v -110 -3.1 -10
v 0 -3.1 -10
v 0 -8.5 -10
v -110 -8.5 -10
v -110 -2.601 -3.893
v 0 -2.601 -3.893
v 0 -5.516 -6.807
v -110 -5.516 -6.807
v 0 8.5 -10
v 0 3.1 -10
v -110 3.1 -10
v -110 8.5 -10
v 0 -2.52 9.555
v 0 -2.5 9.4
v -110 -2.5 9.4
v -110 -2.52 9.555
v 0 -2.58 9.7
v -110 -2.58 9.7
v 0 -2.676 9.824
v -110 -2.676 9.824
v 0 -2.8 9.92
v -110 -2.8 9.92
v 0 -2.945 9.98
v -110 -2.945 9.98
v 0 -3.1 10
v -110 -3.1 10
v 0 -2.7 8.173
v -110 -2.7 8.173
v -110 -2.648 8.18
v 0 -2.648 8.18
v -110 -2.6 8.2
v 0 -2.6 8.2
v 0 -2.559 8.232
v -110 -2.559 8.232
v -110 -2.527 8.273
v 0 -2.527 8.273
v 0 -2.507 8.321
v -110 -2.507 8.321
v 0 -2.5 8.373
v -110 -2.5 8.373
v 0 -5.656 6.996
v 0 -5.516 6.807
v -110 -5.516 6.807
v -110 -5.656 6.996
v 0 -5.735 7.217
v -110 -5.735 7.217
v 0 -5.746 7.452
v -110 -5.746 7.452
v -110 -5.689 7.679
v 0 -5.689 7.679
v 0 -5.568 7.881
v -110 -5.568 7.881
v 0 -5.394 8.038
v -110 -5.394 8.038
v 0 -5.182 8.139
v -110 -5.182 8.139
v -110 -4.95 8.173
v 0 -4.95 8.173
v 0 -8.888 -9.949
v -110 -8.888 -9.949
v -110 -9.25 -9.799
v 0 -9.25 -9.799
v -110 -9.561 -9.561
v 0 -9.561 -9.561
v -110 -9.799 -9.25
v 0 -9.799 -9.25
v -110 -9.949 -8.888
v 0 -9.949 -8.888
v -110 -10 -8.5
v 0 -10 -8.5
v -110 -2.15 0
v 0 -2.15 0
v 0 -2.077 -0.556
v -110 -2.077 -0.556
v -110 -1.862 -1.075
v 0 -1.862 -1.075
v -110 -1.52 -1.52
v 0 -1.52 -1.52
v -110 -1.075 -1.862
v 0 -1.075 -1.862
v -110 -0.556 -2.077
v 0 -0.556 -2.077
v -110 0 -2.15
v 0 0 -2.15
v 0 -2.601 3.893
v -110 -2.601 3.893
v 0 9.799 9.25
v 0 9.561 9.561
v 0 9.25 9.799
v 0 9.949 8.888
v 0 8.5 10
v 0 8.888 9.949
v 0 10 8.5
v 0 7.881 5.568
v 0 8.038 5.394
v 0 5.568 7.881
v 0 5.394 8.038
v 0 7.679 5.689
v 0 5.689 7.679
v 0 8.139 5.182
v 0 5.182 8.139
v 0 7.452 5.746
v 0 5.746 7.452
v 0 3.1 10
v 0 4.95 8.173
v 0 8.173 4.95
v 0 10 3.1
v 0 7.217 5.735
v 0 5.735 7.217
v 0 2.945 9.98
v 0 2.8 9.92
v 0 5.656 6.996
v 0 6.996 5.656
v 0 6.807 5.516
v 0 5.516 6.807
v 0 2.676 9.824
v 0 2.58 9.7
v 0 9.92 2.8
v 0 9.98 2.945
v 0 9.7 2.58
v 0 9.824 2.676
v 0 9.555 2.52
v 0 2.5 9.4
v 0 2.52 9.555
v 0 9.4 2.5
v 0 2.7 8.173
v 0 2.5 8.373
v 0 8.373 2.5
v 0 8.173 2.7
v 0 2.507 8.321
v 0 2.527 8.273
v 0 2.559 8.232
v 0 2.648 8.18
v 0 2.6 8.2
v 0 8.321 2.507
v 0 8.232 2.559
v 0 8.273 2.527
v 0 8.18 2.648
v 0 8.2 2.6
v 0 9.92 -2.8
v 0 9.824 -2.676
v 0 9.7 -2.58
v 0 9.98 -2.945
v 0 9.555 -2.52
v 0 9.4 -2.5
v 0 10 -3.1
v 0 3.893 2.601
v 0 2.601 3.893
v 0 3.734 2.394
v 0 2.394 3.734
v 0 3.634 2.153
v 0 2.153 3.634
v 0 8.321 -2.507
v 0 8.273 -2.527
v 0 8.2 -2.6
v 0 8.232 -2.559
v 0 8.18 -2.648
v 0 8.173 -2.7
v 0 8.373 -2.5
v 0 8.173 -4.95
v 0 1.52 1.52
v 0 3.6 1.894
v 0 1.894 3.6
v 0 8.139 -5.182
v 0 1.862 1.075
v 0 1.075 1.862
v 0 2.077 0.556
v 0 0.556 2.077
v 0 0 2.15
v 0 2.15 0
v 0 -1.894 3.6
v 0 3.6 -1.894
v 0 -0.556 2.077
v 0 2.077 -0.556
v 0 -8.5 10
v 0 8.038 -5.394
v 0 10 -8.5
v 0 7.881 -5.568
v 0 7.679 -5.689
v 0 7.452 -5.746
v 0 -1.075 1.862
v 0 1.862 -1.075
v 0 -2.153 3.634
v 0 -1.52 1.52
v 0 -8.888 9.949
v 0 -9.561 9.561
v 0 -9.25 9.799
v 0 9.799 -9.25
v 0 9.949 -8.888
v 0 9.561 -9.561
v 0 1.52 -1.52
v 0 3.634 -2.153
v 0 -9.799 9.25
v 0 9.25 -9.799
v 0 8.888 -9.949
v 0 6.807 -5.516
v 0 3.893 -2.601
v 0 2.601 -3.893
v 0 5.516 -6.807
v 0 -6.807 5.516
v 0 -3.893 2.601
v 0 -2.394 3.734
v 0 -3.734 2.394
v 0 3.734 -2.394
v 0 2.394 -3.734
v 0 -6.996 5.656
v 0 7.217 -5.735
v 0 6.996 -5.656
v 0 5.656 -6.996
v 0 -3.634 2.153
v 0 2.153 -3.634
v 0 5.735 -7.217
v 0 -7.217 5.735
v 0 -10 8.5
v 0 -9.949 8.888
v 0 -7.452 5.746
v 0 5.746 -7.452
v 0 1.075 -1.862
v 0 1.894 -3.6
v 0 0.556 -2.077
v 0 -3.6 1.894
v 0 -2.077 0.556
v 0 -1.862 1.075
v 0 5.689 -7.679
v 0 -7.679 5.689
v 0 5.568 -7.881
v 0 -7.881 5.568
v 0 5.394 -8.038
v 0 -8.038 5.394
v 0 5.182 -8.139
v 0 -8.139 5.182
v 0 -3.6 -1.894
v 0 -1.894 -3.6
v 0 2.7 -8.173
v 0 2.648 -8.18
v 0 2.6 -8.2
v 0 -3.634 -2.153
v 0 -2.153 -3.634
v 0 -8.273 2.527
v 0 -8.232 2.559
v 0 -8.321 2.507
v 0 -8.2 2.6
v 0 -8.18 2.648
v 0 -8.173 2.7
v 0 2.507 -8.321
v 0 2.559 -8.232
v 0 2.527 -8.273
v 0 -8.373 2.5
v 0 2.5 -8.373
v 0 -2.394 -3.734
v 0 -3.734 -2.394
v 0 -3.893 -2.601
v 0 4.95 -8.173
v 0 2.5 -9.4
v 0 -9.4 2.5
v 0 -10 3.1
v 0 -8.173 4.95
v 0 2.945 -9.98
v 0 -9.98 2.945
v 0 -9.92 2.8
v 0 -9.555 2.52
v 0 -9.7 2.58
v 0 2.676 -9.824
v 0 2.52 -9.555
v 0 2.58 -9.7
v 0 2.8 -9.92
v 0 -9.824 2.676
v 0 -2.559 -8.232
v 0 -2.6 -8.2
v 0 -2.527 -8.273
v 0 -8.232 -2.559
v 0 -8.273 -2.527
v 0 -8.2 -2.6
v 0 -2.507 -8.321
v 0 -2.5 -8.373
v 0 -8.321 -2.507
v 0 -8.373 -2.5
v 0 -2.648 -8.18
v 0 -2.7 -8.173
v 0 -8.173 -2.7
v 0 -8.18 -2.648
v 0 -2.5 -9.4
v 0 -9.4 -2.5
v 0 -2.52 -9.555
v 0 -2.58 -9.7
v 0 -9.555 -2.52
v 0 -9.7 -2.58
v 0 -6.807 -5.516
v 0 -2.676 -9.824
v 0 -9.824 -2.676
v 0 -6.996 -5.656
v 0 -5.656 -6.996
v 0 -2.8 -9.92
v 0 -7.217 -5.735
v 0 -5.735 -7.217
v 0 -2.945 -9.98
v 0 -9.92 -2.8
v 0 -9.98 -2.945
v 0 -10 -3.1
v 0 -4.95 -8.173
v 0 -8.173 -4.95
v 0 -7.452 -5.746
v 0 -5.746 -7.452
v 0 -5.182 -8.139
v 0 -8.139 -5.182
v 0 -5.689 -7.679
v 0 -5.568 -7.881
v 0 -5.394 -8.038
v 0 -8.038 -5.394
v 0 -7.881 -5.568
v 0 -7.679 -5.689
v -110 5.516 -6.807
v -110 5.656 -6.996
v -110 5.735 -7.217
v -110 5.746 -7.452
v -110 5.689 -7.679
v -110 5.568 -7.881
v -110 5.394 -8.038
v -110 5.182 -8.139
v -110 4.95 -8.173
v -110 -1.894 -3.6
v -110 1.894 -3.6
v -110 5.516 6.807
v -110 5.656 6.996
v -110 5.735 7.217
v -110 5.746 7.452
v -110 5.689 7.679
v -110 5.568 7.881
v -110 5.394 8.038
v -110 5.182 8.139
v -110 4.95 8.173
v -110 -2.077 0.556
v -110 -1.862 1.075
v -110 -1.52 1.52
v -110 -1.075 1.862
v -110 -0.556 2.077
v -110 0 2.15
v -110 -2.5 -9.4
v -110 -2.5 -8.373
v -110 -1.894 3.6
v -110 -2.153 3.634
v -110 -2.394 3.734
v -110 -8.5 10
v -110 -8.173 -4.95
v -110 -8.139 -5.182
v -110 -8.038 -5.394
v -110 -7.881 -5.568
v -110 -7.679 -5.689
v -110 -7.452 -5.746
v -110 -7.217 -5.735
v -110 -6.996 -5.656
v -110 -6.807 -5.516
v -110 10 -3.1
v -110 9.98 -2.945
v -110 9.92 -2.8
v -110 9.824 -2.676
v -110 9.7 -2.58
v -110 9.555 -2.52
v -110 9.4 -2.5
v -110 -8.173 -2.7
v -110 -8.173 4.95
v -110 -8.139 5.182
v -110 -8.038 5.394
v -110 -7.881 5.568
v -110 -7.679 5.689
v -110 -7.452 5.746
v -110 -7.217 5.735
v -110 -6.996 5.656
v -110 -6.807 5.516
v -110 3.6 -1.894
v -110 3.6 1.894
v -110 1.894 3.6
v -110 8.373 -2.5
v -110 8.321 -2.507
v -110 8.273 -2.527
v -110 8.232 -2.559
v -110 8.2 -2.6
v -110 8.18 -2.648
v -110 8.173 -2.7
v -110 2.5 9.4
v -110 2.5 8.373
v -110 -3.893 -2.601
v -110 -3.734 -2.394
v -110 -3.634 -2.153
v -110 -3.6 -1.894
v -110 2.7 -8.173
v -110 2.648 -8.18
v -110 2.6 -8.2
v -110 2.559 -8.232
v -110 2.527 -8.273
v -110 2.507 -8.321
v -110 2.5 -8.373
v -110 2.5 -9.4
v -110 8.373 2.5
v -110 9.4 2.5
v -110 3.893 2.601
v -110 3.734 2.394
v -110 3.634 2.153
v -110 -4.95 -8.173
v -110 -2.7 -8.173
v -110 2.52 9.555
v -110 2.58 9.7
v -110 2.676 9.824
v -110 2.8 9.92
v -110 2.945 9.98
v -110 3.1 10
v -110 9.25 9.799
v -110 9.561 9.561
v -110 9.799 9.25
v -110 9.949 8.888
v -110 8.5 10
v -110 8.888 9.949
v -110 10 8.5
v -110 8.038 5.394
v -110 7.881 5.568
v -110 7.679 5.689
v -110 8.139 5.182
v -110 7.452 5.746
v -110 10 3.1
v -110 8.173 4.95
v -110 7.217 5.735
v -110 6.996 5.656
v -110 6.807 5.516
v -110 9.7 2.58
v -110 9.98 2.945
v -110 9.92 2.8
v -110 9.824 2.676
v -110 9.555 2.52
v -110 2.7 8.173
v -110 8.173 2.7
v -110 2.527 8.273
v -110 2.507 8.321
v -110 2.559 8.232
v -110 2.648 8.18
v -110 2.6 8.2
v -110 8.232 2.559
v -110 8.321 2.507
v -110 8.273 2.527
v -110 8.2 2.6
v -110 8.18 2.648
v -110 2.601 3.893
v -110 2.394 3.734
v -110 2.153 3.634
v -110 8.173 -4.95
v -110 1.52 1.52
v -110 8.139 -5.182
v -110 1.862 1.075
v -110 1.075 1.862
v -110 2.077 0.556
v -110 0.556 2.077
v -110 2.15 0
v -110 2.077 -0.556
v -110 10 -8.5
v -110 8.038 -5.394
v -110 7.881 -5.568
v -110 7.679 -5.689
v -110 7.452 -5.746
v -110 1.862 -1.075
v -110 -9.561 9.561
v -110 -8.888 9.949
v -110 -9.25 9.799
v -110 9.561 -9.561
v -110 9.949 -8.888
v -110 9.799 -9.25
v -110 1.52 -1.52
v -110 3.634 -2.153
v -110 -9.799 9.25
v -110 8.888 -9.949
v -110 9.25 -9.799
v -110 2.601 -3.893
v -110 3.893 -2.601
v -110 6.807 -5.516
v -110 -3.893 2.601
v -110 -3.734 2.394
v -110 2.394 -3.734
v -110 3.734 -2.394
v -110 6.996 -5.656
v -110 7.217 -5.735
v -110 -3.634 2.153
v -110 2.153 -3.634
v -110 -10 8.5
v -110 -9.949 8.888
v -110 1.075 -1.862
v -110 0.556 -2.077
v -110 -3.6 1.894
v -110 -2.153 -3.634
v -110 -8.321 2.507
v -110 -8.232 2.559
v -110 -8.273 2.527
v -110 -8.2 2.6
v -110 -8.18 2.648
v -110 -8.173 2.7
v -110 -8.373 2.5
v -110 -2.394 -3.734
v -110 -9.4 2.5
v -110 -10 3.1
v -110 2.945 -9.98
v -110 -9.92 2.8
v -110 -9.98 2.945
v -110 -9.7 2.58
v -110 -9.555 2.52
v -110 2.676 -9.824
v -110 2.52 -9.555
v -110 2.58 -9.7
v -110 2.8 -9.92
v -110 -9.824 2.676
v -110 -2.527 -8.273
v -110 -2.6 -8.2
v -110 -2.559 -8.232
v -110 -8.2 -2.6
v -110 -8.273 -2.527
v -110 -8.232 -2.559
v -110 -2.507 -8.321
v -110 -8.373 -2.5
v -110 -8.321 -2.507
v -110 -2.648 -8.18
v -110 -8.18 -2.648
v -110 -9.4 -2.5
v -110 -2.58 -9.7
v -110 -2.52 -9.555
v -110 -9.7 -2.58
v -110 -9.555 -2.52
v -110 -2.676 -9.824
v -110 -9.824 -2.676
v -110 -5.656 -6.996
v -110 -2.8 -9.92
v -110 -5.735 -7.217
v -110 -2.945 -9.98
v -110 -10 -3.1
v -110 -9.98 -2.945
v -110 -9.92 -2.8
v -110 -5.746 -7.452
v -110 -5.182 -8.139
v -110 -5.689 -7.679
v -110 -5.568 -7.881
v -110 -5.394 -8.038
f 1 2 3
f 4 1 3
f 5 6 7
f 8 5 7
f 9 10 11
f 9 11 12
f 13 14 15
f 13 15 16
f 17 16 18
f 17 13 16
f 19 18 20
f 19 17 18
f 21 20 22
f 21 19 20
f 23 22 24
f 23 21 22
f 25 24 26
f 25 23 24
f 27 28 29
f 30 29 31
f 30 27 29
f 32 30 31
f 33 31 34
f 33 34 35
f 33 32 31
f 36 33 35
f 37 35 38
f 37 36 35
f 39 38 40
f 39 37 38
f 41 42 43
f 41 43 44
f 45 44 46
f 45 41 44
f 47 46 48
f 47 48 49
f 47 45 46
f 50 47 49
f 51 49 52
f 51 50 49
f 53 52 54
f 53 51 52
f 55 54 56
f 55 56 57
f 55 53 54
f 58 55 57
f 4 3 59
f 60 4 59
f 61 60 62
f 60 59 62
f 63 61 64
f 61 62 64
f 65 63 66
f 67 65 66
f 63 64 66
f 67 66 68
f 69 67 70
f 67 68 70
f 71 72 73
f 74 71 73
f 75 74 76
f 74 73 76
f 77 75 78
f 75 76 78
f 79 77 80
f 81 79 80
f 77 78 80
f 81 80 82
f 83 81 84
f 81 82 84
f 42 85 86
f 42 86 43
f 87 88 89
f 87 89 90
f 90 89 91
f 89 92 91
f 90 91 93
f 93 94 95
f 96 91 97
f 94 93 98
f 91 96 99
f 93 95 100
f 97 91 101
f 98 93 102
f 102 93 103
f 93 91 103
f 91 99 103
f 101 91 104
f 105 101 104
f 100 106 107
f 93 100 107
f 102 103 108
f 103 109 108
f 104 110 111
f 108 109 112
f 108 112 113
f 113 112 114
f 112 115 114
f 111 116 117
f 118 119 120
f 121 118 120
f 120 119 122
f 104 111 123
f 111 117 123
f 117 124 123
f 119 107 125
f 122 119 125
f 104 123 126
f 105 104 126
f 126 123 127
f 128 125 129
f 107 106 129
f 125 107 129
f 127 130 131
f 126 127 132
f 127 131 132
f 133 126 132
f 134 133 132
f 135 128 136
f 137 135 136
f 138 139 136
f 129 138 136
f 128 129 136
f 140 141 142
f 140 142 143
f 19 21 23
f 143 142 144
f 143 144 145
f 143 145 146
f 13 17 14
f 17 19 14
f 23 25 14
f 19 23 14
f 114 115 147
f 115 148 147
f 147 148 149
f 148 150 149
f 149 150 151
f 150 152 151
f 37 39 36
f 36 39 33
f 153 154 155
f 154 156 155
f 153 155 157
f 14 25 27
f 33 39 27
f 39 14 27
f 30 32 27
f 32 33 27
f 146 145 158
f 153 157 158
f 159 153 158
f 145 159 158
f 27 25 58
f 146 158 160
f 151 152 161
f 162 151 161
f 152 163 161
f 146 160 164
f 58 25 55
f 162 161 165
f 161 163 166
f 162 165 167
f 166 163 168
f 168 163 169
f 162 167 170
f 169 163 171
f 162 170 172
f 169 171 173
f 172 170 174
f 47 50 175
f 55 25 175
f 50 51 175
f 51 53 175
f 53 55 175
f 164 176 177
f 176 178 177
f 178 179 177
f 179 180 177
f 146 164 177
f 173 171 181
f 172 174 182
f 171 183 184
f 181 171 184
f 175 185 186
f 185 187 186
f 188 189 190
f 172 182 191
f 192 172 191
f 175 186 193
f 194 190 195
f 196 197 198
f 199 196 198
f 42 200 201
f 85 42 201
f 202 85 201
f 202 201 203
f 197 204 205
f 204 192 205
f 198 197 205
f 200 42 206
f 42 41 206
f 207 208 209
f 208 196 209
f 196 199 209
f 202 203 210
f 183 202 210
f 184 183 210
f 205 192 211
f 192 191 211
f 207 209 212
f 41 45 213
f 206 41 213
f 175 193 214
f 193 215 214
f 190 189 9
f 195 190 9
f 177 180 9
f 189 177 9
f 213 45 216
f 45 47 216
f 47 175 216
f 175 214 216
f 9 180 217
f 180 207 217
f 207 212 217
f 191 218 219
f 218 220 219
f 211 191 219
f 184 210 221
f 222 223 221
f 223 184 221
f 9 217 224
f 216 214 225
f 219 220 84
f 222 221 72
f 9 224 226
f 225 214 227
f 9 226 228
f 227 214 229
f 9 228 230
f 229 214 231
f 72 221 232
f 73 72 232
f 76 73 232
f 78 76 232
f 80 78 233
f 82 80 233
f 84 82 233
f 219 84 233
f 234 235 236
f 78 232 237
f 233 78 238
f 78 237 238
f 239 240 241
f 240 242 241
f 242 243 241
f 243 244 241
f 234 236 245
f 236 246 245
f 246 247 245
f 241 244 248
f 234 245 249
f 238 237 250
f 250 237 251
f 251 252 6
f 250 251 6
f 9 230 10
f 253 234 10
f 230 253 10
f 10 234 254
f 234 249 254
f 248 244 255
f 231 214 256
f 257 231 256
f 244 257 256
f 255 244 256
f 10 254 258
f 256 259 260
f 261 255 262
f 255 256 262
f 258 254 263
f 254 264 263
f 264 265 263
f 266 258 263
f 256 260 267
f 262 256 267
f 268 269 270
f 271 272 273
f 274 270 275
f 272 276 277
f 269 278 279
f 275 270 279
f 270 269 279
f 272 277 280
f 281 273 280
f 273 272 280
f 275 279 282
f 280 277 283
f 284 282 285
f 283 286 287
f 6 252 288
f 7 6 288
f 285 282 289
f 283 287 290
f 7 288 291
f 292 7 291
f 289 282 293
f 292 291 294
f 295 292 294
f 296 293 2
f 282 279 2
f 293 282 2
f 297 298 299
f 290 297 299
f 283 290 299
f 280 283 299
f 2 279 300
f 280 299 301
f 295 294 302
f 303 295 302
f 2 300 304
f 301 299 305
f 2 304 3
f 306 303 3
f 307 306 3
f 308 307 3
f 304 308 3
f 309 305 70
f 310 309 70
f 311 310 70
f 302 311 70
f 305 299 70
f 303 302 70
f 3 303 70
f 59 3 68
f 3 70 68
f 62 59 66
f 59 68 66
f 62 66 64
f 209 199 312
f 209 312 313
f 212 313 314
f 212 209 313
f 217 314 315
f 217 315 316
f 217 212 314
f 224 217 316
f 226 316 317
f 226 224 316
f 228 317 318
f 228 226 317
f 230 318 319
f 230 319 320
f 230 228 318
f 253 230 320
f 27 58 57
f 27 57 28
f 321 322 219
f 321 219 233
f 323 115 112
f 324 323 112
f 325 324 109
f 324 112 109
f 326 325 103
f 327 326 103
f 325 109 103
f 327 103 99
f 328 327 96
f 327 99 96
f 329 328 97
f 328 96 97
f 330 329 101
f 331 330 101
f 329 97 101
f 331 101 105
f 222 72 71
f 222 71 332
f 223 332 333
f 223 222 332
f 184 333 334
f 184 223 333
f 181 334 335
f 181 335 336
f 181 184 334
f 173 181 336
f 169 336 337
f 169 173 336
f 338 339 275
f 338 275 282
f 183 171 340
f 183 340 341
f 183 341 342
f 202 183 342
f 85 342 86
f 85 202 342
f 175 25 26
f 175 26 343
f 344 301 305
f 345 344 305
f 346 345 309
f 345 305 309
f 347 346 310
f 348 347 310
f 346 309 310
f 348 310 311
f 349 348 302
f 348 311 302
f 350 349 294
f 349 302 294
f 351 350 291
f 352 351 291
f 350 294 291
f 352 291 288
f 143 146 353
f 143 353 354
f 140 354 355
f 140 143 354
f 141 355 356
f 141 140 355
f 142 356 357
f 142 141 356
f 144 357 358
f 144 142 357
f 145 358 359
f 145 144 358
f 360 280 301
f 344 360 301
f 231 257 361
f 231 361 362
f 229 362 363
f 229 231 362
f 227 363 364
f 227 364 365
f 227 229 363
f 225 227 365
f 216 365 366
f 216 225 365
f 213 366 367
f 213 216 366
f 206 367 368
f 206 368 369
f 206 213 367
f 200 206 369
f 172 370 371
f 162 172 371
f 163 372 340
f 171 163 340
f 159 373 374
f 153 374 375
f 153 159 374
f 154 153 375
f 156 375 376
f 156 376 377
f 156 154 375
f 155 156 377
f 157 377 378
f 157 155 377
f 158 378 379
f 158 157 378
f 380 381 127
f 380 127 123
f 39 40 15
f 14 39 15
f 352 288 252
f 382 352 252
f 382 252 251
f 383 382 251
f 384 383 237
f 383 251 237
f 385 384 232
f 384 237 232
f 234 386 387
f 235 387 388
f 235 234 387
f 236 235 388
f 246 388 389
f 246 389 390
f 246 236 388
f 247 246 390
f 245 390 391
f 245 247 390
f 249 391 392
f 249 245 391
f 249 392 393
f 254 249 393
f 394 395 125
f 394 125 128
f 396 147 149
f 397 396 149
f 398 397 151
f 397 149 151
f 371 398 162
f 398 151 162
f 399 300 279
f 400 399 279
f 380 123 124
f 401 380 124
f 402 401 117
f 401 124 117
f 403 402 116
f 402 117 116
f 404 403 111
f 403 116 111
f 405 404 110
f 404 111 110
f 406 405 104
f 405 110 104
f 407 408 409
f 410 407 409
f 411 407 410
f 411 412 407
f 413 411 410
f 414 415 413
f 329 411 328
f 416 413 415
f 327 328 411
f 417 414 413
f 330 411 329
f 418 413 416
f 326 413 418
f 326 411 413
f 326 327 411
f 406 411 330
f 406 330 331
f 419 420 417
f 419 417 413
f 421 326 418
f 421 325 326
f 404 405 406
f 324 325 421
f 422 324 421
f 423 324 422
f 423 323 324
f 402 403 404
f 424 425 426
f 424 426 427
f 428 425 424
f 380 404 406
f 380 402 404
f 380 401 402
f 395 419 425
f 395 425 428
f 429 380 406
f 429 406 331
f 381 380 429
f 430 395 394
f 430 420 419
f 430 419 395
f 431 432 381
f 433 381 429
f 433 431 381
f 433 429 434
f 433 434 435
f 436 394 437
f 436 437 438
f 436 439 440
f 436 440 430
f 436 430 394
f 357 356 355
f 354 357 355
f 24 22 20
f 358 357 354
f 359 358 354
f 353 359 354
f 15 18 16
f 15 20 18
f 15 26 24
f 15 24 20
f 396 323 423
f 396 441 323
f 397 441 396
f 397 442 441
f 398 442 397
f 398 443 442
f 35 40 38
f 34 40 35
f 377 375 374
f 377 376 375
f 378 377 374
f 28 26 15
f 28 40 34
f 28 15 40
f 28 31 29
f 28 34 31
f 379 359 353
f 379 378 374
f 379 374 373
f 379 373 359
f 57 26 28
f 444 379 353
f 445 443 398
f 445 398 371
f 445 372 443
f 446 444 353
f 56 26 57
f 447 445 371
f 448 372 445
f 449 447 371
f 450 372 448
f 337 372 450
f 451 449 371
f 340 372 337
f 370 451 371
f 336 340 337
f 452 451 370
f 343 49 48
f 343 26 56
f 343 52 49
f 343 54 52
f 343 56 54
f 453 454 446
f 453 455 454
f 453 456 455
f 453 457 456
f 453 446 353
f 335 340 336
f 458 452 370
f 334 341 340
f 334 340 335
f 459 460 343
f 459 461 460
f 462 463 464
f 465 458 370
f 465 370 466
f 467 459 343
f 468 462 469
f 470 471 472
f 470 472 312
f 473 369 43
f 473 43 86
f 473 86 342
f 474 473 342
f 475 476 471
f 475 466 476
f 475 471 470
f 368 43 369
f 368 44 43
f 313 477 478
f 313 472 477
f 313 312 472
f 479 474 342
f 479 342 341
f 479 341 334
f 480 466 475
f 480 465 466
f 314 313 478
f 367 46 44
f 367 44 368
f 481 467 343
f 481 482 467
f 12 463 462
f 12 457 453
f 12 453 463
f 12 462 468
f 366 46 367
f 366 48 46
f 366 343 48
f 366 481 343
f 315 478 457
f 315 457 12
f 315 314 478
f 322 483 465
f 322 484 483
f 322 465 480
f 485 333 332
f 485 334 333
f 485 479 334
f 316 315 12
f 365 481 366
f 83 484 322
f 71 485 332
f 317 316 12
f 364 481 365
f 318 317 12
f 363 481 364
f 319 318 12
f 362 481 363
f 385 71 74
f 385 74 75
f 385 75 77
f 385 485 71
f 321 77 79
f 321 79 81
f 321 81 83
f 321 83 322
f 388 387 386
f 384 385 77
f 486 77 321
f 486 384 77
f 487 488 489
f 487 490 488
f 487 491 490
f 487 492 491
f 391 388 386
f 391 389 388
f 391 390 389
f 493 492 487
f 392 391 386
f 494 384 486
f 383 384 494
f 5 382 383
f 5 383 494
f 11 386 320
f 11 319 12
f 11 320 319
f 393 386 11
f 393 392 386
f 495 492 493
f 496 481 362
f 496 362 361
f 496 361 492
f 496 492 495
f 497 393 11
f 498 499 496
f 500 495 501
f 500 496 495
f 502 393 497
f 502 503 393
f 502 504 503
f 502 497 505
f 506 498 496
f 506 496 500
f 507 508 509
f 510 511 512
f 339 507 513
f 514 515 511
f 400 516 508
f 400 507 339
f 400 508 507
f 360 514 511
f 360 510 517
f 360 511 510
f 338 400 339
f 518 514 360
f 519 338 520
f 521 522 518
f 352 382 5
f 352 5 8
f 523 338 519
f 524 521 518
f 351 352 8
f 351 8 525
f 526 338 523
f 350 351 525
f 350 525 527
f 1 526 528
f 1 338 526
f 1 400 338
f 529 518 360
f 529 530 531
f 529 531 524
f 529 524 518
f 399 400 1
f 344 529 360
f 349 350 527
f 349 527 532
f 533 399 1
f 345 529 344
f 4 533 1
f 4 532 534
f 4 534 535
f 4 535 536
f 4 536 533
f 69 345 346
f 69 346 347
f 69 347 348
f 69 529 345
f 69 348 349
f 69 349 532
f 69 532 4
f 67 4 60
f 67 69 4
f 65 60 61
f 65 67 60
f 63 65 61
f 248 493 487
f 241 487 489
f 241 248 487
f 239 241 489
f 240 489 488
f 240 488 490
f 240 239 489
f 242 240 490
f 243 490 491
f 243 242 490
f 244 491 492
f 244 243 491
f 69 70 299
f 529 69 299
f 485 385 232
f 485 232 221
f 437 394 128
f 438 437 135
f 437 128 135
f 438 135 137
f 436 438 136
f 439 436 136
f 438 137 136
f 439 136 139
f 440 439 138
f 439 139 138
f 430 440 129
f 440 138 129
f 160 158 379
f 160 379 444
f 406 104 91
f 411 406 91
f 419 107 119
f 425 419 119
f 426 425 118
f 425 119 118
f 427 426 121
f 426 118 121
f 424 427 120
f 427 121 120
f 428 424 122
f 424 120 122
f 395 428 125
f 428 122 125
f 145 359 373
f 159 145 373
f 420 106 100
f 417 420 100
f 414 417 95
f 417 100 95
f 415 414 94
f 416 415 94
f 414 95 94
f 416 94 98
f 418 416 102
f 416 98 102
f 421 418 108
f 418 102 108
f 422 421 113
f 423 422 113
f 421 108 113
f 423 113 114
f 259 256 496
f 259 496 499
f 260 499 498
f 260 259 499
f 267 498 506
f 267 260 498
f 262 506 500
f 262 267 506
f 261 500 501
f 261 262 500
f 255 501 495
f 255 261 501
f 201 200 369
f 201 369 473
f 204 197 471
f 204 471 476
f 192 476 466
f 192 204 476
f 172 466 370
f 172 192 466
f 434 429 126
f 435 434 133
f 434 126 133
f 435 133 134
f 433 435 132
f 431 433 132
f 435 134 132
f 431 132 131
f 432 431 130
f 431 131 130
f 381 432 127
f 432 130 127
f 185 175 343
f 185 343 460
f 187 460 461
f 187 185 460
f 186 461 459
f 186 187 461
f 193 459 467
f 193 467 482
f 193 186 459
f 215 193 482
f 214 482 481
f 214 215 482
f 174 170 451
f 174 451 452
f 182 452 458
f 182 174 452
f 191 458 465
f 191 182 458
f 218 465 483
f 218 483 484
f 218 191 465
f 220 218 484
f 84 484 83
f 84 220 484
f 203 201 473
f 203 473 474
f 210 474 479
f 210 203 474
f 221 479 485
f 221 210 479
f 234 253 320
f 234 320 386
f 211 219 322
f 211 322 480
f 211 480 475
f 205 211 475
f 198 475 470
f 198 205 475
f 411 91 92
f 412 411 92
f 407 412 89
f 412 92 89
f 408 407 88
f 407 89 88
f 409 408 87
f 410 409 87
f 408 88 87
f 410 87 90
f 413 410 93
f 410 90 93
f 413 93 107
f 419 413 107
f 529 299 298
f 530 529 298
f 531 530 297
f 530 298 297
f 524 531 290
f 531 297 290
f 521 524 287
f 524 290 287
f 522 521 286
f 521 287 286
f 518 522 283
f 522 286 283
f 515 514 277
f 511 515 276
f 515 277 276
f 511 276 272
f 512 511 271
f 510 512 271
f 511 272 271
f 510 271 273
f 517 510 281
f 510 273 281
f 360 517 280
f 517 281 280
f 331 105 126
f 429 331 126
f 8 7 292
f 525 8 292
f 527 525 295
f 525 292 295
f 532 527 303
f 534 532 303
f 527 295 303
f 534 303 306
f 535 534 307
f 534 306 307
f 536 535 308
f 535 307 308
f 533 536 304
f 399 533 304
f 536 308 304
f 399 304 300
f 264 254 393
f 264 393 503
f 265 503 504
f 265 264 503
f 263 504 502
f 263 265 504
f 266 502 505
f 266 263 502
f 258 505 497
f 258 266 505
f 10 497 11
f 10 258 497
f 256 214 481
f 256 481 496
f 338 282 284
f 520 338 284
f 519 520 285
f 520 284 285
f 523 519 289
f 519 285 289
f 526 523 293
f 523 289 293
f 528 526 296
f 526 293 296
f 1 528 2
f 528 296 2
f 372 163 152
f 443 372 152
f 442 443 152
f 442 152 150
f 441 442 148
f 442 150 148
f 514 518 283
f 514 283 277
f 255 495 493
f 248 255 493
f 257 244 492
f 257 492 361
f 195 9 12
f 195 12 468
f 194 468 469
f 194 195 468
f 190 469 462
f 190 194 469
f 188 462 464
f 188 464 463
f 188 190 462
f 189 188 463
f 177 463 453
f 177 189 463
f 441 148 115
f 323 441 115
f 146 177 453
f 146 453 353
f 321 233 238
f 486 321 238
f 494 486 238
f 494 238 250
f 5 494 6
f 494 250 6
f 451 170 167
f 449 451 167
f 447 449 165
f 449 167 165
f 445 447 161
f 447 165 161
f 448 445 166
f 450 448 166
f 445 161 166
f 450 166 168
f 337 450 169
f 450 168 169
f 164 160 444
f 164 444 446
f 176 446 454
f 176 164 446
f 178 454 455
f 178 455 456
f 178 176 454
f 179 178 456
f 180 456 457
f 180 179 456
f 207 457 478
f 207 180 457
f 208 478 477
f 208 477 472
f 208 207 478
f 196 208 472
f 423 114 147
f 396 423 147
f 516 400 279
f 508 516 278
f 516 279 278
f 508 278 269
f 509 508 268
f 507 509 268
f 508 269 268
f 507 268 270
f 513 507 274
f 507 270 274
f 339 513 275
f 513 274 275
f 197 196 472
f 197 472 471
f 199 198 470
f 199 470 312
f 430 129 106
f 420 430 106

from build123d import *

# Parameters (mm, degrees)
BOSS_EXTRUDE1_DEPTH = 110


with BuildPart() as part:
    # Sketch3 → Boss-Extrude1 (new body)
    with BuildSketch(Plane(origin=(0, 0, 0), x_dir=(0, 0, -1), z_dir=(1, 0, 0))):
        with BuildLine():
            Line((-5.515685425, 6.807463915), (-2.601114729, 3.892893219))
            ThreePointArc((-2.601114729, 3.892893219), (-2.27669138, 3.676120467), (-1.894007948, 3.6))
            Line((-1.894007948, 3.6), (0, 3.6))
            Line((0, 3.6), (0, 2.15))
            ThreePointArc((0, 2.15), (-1.52027958, 1.52027958), (-2.15, 0))
            Line((-2.15, 0), (-3.6, 0))
            Line((-3.6, 0), (-3.6, 1.894007948))
            ThreePointArc((-3.6, 1.894007948), (-3.676120467, 2.27669138), (-3.892893219, 2.601114729))
            Line((-3.892893219, 2.601114729), (-6.807463915, 5.515685425))
            ThreePointArc((-6.807463915, 5.515685425), (-7.679296086, 5.689103626), (-8.17314934, 4.95))
            Line((-8.17314934, 4.95), (-8.17314934, 2.7))
            ThreePointArc((-8.17314934, 2.7), (-8.231727984, 2.558578644), (-8.37314934, 2.5))
            Line((-8.37314934, 2.5), (-9.4, 2.5))
            ThreePointArc((-9.4, 2.5), (-9.824264069, 2.675735931), (-10, 3.1))
            Line((-10, 3.1), (-10, 8.5))
            ThreePointArc((-10, 8.5), (-9.560660172, 9.560660172), (-8.5, 10))
            Line((-8.5, 10), (-3.1, 10))
            ThreePointArc((-3.1, 10), (-2.675735931, 9.824264069), (-2.5, 9.4))
            Line((-2.5, 9.4), (-2.5, 8.37314934))
            ThreePointArc((-2.5, 8.37314934), (-2.558578644, 8.231727984), (-2.7, 8.17314934))
            Line((-2.7, 8.17314934), (-4.95, 8.17314934))
            ThreePointArc((-4.95, 8.17314934), (-5.689103626, 7.679296086), (-5.515685425, 6.807463915))
        make_face()
    extrude(amount=-BOSS_EXTRUDE1_DEPTH)

    # Mirror1: part across plane


with BuildPart() as part_1:
    add(part.part)
    add(part.part.mirror(Plane.ZX))

    # Mirror2: part across plane


with BuildPart() as part_2:
    add(part_1.part)
    add(part_1.part.mirror(Plane.XY))


solid = part_2.part
